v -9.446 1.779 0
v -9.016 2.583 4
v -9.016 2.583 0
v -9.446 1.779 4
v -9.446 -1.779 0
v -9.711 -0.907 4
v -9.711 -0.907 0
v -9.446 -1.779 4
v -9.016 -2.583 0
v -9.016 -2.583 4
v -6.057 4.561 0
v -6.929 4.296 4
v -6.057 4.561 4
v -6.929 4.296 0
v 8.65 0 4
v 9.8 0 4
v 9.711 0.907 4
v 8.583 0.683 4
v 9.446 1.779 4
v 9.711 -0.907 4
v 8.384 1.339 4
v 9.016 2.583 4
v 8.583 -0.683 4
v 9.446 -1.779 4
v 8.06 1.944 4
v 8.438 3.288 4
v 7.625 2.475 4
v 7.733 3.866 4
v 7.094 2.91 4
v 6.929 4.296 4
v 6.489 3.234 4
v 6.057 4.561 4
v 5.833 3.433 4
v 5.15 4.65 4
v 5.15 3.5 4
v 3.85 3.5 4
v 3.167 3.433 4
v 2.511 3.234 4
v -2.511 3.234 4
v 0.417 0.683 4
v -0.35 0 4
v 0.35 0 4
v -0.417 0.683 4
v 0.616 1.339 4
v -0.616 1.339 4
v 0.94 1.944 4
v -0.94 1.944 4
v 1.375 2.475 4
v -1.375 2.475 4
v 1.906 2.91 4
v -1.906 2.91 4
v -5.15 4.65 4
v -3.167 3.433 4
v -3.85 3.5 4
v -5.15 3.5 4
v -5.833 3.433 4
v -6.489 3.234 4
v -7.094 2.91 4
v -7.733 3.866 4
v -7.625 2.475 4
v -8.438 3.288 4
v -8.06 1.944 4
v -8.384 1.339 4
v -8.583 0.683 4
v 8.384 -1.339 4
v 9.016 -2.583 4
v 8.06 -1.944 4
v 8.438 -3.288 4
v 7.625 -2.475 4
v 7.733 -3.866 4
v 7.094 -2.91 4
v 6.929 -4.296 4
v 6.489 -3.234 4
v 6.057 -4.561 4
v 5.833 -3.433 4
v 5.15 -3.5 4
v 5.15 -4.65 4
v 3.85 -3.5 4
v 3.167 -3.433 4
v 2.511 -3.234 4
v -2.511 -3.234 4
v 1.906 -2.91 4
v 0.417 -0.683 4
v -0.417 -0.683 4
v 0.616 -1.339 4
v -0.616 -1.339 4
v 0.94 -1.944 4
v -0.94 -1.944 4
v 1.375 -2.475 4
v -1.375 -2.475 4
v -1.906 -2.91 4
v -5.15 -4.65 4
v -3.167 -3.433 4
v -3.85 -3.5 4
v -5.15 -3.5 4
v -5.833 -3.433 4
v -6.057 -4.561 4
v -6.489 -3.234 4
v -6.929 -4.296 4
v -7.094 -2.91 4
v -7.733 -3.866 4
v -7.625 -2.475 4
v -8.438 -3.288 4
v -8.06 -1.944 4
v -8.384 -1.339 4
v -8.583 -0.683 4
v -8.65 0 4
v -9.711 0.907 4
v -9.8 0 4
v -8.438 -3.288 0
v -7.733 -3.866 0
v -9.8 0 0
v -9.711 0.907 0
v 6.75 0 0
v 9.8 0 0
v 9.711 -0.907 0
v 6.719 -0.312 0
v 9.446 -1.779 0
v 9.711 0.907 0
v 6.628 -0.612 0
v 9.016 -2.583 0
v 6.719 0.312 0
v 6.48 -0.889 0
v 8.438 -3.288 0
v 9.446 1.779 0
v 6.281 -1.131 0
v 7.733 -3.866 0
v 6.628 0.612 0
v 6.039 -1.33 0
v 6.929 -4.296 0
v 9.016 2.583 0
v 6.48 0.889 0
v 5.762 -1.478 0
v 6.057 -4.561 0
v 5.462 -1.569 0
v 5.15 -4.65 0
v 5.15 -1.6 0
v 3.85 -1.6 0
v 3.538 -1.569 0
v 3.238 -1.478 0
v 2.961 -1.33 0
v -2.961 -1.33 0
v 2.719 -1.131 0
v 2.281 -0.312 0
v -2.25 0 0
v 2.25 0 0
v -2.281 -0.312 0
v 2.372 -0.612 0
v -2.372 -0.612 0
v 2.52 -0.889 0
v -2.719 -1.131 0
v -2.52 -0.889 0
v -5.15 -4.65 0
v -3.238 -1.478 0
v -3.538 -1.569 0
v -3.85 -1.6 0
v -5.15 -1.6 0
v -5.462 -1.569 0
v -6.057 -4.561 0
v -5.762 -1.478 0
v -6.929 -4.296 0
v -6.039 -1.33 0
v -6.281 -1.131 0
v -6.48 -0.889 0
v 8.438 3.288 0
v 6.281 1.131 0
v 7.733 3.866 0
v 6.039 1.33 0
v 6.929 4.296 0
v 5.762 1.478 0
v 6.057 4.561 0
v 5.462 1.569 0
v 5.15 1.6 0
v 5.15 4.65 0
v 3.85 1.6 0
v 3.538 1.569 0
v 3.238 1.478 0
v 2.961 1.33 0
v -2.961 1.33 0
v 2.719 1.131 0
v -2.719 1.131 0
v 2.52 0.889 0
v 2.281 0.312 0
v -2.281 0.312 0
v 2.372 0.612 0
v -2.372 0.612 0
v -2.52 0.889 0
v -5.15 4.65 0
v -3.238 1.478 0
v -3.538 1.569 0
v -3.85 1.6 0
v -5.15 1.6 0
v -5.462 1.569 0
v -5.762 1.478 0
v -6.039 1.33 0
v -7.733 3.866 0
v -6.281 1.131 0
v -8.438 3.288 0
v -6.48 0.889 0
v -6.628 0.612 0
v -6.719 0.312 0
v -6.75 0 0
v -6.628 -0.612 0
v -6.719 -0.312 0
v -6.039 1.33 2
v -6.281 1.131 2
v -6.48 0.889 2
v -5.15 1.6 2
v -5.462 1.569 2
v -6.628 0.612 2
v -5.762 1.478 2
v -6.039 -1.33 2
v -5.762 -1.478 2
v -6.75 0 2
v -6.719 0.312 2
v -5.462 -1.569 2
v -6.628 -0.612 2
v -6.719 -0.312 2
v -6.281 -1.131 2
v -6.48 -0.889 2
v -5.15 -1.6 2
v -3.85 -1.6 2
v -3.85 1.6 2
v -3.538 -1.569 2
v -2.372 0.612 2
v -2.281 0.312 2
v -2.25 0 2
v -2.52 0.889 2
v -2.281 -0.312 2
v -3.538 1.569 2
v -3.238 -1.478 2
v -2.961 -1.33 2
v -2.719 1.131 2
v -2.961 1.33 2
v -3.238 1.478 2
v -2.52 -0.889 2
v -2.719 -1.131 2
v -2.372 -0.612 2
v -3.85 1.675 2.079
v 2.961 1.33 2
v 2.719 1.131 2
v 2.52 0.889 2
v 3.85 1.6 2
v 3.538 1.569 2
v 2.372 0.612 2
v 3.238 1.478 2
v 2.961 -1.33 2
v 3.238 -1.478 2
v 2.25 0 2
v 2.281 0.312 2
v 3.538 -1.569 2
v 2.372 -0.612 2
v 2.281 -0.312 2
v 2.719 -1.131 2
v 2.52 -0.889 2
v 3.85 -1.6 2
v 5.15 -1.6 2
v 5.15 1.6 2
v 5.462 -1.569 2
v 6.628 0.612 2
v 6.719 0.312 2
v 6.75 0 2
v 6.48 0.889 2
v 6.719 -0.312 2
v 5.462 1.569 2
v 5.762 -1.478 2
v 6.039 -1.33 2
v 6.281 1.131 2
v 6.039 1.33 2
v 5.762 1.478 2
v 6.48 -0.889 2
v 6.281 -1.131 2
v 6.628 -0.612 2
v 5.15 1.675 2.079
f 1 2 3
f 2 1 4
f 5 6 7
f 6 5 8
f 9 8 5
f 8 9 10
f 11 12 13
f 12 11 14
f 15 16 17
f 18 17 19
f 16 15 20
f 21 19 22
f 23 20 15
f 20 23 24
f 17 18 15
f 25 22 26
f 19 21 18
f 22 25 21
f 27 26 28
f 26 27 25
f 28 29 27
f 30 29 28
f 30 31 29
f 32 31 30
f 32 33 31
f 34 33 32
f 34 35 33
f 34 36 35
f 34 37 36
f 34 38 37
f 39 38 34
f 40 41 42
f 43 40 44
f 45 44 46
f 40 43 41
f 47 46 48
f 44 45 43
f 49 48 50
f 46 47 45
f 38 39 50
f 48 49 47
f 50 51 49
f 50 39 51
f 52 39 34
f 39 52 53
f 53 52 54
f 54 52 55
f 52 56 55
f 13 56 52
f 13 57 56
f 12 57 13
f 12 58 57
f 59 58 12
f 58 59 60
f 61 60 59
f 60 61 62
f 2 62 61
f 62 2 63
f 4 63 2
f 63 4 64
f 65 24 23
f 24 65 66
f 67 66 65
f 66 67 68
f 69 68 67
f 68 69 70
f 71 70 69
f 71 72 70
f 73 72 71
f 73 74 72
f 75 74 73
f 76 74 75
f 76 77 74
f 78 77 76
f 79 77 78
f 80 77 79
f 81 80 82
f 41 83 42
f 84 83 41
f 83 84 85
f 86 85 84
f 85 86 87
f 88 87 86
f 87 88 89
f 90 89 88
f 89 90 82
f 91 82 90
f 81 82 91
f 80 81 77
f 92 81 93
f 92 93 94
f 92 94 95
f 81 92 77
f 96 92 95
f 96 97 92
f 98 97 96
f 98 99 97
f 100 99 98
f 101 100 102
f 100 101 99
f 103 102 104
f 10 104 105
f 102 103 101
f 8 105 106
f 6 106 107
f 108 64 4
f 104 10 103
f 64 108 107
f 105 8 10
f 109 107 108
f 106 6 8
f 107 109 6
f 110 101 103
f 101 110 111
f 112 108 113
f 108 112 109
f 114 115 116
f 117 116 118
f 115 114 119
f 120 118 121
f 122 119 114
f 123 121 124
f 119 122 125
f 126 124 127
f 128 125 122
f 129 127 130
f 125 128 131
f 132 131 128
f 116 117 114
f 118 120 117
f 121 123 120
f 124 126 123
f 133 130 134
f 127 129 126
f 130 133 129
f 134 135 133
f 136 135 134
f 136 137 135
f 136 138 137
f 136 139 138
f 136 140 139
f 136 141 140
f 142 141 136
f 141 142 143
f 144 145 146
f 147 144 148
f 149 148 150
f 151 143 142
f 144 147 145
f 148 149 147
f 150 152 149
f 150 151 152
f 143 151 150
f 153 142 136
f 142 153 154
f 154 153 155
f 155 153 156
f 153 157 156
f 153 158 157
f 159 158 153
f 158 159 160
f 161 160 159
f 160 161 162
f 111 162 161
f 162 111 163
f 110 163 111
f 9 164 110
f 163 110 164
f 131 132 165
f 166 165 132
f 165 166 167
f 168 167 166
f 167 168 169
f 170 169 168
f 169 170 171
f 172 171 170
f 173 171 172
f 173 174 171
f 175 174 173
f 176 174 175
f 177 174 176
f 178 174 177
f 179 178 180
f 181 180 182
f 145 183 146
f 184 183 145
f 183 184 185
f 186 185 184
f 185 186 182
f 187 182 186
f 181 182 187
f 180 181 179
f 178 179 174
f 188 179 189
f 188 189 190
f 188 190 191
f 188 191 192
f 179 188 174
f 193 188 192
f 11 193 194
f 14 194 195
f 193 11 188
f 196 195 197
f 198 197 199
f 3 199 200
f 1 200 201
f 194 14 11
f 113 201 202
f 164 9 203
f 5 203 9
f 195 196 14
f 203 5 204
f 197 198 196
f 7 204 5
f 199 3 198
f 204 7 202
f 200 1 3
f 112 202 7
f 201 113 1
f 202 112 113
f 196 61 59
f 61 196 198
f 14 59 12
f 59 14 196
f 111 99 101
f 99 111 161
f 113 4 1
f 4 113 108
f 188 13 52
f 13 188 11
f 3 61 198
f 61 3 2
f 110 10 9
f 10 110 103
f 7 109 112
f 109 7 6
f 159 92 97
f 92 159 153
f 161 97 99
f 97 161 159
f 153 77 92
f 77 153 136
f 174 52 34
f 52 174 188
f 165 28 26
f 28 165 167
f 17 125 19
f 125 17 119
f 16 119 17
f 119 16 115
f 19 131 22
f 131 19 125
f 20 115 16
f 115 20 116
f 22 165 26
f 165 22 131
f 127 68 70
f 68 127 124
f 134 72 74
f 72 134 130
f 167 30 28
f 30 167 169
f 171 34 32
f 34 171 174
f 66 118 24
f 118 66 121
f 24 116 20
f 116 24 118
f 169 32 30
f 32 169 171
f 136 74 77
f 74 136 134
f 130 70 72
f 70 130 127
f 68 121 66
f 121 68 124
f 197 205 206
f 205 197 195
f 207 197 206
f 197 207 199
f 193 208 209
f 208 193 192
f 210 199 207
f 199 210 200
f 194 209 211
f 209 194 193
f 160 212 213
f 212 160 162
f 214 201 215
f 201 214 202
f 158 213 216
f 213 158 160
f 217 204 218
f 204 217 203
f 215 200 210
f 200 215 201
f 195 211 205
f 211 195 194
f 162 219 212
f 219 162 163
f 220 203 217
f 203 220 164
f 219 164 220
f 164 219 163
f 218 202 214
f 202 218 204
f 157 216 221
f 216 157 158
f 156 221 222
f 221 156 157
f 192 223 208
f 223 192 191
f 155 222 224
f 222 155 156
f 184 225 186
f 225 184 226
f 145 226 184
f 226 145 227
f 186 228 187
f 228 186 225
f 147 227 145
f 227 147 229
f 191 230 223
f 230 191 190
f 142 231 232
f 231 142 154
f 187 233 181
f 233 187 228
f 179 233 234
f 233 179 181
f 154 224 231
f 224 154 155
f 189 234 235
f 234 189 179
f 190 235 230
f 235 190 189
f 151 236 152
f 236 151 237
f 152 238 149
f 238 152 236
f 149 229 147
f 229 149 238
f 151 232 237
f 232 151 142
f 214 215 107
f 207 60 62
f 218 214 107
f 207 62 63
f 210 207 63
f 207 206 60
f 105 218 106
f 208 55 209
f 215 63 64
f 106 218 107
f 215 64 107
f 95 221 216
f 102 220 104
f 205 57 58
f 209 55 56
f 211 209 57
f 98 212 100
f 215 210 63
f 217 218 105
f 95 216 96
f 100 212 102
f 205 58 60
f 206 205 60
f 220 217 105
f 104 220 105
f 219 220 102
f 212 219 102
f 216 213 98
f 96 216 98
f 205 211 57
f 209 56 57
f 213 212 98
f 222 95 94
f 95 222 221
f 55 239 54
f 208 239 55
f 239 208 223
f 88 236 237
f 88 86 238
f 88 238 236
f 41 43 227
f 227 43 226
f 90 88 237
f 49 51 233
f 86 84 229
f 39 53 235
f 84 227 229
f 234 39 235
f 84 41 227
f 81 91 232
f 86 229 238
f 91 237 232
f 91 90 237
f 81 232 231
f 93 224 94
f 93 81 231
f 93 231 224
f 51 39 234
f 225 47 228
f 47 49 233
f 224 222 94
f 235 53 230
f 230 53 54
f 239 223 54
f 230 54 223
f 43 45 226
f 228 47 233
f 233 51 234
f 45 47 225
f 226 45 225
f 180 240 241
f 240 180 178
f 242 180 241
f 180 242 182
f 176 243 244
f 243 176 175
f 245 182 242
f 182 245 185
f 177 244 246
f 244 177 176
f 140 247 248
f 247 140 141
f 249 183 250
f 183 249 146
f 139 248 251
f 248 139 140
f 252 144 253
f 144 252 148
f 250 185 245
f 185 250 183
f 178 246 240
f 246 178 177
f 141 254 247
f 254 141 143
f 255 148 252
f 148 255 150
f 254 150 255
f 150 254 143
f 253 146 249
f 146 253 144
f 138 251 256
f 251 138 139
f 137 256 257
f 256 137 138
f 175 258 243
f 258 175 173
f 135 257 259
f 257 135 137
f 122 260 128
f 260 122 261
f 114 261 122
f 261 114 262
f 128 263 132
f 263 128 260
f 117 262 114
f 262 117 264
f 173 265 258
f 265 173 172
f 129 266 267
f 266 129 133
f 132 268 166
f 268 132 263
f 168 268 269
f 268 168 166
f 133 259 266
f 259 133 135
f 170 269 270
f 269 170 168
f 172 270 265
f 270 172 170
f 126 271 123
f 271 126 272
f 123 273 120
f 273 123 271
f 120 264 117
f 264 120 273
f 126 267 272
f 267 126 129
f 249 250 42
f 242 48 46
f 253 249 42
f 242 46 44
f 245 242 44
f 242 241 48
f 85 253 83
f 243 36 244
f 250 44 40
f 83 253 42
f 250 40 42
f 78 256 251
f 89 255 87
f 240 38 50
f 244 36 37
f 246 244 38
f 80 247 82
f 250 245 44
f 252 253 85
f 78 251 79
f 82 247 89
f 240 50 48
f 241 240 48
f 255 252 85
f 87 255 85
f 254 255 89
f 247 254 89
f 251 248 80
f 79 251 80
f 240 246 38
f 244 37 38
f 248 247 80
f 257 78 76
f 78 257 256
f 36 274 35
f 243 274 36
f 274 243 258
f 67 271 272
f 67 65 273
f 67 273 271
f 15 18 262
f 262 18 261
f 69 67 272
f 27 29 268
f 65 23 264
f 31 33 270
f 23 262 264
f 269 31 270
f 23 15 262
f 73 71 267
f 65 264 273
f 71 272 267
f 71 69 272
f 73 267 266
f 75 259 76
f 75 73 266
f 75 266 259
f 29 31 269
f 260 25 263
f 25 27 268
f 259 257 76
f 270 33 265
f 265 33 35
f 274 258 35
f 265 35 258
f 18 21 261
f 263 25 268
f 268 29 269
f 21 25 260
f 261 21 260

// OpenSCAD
// Piece measurements

full_length = 19.6;
full_width = 9.3;
full_height = 4;
indent_bottom_length = 4.5;
indent_bottom_width = 3.2;
indent_top_width = 7.0;

// Calculations

bottom_edge = (full_width - indent_bottom_width) / 2;
echo(bottom_edge);
offset = (full_length / 2) - (bottom_edge) - (indent_bottom_length / 2);

$fn = $preview ? 32 : 32;

difference() {
  long_cylinder(full_length, full_width, full_height);
  
  translate([-offset, 0, 0]) { 
    indent();
  }
  translate([offset, 0, 0]) { 
    indent();
  }
}

module indent()
{
  each_height = (full_height / 2);
  
  union() {
    long_cylinder(indent_bottom_length, indent_bottom_width, each_height);
    translate([0, 0, 2]) {
      long_flared_cylinder(indent_bottom_length, indent_bottom_width, indent_top_width, each_height);
    }
  }
}

module long_cylinder(length, width, height)
{
  long_flared_cylinder(length, width, width, height);
}

module long_flared_cylinder(length, width_bottom, width_top, height)
{
  radius_bottom = width_bottom / 2;
  radius_top = width_top / 2;
  cube_length = length - width_bottom;
  
  union() {
    translate([length / 2 - radius_bottom, 0, 0]) {
      cylinder(height, radius_bottom, radius_top);
    }
    
    translate([-(length / 2 - radius_bottom), 0, 0]) {
      union() {
        cylinder(height, radius_bottom, radius_top);
        translate([0, -radius_bottom, 0]) { 
          trapezoid(cube_length, width_bottom, width_top, height);
        }
      }
    }
  }
}

module trapezoid(length, width_bottom, width_top, height) 
{
  diff = width_top - width_bottom;
  offset = diff / 2;
  
  points = [
    [0, 0, 0],
    [length, 0, 0],
    [length, width_bottom, 0],
    [0, width_bottom, 0],
    [0, -offset, height],
    [length, -offset, height],
    [length, width_top - offset, height],
    [0, width_top - offset, height]
  ];
  faces = [
    [0,1,2,3],
    [4,5,1,0],
    [7,6,5,4],
    [5,6,2,1],
    [6,7,3,2],
    [7,4,0,3]
  ];
  polyhedron(points, faces);  
}
